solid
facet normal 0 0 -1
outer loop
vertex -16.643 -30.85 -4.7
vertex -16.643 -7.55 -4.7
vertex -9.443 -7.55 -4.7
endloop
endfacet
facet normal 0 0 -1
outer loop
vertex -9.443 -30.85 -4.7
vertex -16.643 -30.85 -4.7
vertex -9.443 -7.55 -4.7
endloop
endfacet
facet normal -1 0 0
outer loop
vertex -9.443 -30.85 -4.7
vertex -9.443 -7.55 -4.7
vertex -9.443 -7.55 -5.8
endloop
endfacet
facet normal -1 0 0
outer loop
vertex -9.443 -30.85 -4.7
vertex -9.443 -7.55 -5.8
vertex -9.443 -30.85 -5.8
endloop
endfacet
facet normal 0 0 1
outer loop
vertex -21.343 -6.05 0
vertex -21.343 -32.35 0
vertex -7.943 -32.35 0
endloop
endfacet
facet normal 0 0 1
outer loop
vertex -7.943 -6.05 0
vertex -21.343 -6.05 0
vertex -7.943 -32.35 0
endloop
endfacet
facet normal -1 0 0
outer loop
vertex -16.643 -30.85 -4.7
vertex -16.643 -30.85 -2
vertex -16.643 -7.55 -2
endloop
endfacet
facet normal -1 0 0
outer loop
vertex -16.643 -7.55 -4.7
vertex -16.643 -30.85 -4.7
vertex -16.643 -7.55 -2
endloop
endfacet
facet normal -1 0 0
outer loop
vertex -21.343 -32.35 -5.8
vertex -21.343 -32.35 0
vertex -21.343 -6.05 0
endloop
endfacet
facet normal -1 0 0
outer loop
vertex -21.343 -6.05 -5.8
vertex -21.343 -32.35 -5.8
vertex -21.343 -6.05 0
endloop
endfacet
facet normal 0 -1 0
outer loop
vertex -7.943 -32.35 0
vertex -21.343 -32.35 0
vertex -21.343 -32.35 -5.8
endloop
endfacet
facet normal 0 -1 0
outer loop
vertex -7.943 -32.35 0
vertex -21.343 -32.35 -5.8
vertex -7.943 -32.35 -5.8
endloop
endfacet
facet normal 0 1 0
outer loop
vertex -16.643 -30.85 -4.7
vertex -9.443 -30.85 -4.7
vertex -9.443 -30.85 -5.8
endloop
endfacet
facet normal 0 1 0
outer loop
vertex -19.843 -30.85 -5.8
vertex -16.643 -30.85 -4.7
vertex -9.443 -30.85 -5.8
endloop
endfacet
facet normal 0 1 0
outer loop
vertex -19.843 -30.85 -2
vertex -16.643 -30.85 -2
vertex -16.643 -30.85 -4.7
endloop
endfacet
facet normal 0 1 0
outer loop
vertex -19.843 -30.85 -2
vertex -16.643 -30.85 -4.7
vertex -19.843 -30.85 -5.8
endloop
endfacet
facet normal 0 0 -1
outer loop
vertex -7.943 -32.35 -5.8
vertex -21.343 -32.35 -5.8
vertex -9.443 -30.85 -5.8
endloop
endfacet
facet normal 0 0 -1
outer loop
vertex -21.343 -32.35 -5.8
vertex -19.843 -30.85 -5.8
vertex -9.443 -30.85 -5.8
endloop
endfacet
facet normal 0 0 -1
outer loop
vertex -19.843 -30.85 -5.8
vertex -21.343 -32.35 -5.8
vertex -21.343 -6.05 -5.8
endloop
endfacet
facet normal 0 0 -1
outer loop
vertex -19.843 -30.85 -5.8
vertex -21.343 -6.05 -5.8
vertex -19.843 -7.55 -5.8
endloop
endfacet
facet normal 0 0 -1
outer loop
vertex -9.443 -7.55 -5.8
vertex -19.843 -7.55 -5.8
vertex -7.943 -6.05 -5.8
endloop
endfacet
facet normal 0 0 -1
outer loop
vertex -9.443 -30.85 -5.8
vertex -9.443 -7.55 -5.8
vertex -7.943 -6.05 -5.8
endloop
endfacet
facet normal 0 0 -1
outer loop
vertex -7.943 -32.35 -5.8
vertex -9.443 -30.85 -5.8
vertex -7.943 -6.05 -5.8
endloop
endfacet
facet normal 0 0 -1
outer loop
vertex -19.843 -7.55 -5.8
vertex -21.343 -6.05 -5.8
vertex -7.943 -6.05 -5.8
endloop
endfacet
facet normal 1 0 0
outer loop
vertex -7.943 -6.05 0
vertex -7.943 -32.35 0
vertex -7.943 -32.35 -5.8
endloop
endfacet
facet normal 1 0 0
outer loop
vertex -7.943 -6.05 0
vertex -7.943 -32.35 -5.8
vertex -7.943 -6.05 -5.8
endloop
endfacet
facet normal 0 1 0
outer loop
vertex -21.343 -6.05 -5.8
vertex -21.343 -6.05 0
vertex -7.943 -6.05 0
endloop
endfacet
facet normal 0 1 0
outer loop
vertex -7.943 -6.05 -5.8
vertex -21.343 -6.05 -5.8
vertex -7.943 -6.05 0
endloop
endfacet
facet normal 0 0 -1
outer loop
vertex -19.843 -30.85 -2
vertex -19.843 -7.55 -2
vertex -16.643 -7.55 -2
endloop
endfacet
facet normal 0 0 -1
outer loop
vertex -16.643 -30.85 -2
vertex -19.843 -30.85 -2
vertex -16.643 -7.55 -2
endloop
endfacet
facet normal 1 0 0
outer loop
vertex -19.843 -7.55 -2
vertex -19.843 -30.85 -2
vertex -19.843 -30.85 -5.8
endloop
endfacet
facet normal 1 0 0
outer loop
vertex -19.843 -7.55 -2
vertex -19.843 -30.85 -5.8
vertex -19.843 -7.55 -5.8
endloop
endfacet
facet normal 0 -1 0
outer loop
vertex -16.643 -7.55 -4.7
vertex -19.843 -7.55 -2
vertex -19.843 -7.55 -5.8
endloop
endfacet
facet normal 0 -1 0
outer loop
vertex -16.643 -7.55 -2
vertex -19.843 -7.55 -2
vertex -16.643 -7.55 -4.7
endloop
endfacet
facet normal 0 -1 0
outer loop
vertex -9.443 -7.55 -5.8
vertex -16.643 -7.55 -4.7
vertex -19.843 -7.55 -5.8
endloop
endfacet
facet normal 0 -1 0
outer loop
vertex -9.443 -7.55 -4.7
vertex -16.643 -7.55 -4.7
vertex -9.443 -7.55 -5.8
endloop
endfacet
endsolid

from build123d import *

# Parameters (mm, degrees)
F0_W     = 13.4
F0_H     = 26.3
F1_DEPTH = 5.8
F0_W_2   = 3.2
F0_H_2   = 23.3
F2_DEPTH = 2
F0_W_3   = 7.2
F3_DEPTH = 4.7


with BuildPart() as f1:
    # F0 (on Top) → F1 (new body)
    with BuildSketch(Plane.XY):
        with Locations((-14.642743, -19.200002)):
            Rectangle(F0_W, F0_H)
        Polygon((-19.842743, -30.850002), (-19.842743, -7.550002), (-16.642743, -7.550002), (-9.442743, -7.550002), (-9.442743, -30.850002), (-16.642743, -30.850002), align=None, mode=Mode.SUBTRACT)
    extrude(amount=-F1_DEPTH)

    # F0 (on Top) → F2 (join)
    with BuildSketch(Plane.XY):
        with Locations((-18.242743, -19.200002)):
            Rectangle(F0_W_2, F0_H_2)
    extrude(amount=-F2_DEPTH)

    # F0 (on Top) → F3 (join)
    with BuildSketch(Plane.XY):
        with Locations((-13.042743, -19.200002)):
            Rectangle(F0_W_3, F0_H_2)
    extrude(amount=-F3_DEPTH)


solid = f1.part
